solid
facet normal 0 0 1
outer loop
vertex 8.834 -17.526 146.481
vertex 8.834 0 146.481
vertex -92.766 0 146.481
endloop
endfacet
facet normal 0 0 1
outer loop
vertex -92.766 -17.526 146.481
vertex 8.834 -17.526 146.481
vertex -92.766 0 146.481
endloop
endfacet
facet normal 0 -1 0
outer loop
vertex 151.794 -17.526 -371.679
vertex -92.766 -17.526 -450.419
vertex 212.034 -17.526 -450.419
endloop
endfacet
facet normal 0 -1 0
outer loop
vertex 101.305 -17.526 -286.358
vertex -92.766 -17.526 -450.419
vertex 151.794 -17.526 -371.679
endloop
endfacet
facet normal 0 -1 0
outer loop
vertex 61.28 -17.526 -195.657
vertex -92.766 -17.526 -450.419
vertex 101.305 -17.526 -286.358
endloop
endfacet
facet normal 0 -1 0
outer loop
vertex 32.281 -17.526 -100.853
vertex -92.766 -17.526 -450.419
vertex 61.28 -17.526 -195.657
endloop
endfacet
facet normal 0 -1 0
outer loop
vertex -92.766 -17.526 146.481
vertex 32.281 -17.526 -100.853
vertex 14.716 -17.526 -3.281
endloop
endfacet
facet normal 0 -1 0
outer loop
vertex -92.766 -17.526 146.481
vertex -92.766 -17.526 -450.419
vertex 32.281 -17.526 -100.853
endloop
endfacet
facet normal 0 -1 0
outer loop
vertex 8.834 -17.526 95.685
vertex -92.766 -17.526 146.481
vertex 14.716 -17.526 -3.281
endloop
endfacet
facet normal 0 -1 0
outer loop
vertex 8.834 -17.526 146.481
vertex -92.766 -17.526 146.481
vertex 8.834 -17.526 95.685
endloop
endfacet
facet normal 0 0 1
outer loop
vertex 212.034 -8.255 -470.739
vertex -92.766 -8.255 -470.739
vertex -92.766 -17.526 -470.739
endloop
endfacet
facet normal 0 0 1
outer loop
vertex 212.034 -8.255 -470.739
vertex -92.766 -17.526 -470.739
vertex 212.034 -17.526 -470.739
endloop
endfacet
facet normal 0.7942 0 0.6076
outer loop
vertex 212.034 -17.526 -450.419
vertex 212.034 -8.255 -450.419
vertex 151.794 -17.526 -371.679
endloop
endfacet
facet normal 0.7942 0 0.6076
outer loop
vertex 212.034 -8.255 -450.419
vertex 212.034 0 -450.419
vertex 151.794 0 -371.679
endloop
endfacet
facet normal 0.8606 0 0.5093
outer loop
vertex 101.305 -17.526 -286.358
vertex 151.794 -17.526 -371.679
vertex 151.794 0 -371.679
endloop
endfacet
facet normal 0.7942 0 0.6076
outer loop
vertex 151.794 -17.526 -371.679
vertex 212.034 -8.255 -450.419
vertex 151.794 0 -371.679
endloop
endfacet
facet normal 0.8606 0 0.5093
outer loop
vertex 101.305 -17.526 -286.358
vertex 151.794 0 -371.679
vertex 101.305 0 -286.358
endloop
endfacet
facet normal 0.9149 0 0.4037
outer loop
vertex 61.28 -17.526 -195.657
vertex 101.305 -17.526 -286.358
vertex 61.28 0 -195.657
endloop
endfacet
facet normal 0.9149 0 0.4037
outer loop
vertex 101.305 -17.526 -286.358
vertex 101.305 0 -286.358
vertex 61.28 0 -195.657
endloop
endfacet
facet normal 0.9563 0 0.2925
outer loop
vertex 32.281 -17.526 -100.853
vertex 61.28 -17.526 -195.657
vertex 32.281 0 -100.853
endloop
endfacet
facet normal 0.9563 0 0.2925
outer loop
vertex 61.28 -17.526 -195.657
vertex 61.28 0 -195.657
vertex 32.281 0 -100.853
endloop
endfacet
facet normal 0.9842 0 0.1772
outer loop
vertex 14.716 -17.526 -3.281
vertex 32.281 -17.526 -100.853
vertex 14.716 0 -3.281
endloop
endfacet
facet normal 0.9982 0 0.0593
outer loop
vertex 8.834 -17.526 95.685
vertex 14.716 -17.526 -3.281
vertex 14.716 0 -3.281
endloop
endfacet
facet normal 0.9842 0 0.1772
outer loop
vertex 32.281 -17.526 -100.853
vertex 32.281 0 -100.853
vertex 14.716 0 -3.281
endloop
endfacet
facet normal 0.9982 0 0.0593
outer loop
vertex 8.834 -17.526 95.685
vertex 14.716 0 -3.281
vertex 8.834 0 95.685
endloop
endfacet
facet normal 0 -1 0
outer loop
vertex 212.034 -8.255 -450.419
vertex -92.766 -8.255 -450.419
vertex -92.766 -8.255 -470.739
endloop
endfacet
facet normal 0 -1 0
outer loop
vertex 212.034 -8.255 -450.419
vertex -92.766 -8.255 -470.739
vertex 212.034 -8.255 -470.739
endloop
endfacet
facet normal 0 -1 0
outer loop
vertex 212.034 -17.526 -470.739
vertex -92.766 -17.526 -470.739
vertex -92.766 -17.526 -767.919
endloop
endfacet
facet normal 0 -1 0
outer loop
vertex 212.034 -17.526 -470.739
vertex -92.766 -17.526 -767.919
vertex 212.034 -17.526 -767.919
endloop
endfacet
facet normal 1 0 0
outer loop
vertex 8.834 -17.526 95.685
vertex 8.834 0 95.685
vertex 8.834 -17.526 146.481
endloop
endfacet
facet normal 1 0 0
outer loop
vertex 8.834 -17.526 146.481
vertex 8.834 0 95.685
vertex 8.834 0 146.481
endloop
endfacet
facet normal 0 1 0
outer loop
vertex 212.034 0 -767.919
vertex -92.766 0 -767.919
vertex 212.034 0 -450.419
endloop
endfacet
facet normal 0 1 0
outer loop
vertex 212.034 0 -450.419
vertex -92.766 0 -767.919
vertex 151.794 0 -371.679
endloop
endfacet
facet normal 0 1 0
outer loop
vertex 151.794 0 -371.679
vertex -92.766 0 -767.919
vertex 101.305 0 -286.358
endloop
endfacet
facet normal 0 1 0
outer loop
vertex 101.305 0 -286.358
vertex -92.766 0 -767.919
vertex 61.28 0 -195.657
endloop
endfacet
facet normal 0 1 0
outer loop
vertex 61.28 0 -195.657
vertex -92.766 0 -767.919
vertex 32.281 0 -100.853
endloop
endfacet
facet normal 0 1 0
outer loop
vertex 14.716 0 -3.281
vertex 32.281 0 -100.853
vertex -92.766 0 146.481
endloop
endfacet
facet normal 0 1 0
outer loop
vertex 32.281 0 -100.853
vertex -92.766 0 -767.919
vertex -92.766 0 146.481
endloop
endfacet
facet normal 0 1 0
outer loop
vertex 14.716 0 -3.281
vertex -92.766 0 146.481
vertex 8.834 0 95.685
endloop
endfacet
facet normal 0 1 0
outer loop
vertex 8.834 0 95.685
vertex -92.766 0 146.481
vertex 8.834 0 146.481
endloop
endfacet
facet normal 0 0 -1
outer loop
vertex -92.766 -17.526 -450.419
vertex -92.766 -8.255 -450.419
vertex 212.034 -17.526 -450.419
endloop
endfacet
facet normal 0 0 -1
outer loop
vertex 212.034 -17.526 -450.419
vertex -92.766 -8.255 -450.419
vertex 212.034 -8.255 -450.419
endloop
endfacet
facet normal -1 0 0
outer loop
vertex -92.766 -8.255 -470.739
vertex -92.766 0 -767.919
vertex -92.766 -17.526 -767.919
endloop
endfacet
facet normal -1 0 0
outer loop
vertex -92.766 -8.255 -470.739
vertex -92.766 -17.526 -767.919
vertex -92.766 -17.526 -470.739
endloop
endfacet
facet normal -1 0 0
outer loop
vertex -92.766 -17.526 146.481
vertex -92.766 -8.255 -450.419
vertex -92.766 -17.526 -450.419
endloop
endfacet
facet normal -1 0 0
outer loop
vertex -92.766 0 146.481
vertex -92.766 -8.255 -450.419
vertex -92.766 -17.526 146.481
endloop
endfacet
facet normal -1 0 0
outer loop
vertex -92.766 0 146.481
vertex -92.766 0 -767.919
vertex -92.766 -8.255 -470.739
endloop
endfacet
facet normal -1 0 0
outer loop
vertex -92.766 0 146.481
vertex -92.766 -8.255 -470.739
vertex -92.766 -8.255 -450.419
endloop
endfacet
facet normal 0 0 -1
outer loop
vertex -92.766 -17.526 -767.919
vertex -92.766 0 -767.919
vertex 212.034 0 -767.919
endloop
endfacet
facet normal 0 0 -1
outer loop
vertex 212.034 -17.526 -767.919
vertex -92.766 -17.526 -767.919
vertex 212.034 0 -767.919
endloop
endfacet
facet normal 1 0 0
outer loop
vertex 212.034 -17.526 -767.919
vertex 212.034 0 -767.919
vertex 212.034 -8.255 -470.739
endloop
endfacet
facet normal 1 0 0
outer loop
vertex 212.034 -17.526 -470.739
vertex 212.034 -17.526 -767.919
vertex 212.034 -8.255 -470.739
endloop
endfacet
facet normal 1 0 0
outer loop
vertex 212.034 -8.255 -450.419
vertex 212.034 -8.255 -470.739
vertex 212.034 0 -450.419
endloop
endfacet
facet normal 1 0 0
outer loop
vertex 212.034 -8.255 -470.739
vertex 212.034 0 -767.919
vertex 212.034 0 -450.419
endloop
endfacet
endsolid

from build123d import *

# Parameters (mm, degrees)
F1_DEPTH = 17.526
F0_W     = 304.8
F0_H     = 20.32
F2_DEPTH = 8.255
F0_H_2   = 297.18
F3_DEPTH = 17.526


with BuildPart() as f1:
    # F0 (on Front) → F1 (new body)
    with BuildSketch(Plane.XZ):
        with BuildLine():
            Line((8.833553, 146.481255), (-92.766447, 146.481255))
            Line((-92.766447, 146.481255), (-92.766447, -450.418745))
            Line((-92.766447, -450.418745), (212.033553, -450.418745))
            ThreePointArc((212.033553, -450.418745), (61.279772, -195.656633), (8.833553, 95.684799))
            Line((8.833553, 95.684799), (8.833553, 146.481255))
        make_face()
    extrude(amount=F1_DEPTH)

    # F0 (on Front) → F2 (join)
    with BuildSketch(Plane.XZ):
        with Locations((59.633553, -460.578745)):
            Rectangle(F0_W, F0_H)
    extrude(amount=F2_DEPTH)

    # F0 (on Front) → F3 (join)
    with BuildSketch(Plane.XZ):
        with Locations((59.633553, -619.328745)):
            Rectangle(F0_W, F0_H_2)
    extrude(amount=F3_DEPTH)


solid = f1.part
